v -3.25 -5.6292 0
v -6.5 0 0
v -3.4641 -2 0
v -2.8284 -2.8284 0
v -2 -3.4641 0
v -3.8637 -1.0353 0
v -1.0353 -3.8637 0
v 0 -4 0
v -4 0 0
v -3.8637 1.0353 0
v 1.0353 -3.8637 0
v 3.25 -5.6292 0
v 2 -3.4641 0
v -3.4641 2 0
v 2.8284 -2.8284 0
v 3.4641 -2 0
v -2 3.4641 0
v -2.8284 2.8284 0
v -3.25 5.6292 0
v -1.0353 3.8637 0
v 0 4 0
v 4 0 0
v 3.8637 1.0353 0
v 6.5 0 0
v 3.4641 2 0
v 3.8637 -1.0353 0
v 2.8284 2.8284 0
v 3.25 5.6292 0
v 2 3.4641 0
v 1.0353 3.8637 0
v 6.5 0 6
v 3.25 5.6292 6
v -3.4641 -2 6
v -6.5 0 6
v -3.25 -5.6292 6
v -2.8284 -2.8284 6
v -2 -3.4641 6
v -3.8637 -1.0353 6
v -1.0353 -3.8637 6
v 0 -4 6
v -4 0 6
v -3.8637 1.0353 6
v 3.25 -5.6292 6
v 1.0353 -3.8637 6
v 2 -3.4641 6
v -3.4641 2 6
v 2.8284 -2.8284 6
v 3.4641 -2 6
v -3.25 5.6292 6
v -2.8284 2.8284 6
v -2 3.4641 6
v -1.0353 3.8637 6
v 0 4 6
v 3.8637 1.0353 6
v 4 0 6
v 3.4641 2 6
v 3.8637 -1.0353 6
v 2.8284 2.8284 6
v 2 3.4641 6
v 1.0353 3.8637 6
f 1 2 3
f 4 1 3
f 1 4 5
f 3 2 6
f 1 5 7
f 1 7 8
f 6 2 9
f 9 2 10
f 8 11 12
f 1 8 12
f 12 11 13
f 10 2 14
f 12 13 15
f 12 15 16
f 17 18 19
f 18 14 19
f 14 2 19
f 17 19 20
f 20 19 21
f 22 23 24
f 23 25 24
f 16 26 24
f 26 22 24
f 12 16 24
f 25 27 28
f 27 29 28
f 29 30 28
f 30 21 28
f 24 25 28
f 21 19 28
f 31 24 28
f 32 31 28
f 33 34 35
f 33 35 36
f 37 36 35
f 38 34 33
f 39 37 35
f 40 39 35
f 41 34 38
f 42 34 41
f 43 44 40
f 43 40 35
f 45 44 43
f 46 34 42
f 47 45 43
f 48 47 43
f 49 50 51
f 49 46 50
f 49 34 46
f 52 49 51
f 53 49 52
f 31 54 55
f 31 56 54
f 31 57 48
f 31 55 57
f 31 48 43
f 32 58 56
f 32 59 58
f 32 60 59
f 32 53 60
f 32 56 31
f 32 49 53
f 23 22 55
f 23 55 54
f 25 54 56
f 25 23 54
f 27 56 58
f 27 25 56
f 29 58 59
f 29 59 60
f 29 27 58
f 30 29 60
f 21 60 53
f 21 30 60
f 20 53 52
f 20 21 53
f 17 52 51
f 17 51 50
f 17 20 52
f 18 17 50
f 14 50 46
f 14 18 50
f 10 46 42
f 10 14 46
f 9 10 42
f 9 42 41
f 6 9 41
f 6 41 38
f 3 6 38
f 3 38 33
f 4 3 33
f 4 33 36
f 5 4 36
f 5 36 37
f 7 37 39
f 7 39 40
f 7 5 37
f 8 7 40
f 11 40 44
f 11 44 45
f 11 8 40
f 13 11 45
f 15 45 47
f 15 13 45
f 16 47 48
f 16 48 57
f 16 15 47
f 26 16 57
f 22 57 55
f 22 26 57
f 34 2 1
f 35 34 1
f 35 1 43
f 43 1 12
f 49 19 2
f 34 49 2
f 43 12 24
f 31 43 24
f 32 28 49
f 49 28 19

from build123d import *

# Parameters (mm, degrees)
BOSS_EXTRUDE1_DEPTH = 6
SKETCH2_R           = 4
CUT_EXTRUDE1_DEPTH  = 6


with BuildPart() as part:
    # Sketch1 → Boss-Extrude1 (new body)
    with BuildSketch(Plane.XY):
        Polygon((6.5, 0), (3.25, 5.629165125), (-3.25, 5.629165125), (-6.5, 0), (-3.25, -5.629165125), (3.25, -5.629165125), align=None)
    extrude(amount=BOSS_EXTRUDE1_DEPTH)

    # Sketch2 → Cut-Extrude1 (cut)
    with BuildSketch(Plane.XY):
        Circle(SKETCH2_R)
    extrude(amount=CUT_EXTRUDE1_DEPTH, mode=Mode.SUBTRACT)


solid = part.part
